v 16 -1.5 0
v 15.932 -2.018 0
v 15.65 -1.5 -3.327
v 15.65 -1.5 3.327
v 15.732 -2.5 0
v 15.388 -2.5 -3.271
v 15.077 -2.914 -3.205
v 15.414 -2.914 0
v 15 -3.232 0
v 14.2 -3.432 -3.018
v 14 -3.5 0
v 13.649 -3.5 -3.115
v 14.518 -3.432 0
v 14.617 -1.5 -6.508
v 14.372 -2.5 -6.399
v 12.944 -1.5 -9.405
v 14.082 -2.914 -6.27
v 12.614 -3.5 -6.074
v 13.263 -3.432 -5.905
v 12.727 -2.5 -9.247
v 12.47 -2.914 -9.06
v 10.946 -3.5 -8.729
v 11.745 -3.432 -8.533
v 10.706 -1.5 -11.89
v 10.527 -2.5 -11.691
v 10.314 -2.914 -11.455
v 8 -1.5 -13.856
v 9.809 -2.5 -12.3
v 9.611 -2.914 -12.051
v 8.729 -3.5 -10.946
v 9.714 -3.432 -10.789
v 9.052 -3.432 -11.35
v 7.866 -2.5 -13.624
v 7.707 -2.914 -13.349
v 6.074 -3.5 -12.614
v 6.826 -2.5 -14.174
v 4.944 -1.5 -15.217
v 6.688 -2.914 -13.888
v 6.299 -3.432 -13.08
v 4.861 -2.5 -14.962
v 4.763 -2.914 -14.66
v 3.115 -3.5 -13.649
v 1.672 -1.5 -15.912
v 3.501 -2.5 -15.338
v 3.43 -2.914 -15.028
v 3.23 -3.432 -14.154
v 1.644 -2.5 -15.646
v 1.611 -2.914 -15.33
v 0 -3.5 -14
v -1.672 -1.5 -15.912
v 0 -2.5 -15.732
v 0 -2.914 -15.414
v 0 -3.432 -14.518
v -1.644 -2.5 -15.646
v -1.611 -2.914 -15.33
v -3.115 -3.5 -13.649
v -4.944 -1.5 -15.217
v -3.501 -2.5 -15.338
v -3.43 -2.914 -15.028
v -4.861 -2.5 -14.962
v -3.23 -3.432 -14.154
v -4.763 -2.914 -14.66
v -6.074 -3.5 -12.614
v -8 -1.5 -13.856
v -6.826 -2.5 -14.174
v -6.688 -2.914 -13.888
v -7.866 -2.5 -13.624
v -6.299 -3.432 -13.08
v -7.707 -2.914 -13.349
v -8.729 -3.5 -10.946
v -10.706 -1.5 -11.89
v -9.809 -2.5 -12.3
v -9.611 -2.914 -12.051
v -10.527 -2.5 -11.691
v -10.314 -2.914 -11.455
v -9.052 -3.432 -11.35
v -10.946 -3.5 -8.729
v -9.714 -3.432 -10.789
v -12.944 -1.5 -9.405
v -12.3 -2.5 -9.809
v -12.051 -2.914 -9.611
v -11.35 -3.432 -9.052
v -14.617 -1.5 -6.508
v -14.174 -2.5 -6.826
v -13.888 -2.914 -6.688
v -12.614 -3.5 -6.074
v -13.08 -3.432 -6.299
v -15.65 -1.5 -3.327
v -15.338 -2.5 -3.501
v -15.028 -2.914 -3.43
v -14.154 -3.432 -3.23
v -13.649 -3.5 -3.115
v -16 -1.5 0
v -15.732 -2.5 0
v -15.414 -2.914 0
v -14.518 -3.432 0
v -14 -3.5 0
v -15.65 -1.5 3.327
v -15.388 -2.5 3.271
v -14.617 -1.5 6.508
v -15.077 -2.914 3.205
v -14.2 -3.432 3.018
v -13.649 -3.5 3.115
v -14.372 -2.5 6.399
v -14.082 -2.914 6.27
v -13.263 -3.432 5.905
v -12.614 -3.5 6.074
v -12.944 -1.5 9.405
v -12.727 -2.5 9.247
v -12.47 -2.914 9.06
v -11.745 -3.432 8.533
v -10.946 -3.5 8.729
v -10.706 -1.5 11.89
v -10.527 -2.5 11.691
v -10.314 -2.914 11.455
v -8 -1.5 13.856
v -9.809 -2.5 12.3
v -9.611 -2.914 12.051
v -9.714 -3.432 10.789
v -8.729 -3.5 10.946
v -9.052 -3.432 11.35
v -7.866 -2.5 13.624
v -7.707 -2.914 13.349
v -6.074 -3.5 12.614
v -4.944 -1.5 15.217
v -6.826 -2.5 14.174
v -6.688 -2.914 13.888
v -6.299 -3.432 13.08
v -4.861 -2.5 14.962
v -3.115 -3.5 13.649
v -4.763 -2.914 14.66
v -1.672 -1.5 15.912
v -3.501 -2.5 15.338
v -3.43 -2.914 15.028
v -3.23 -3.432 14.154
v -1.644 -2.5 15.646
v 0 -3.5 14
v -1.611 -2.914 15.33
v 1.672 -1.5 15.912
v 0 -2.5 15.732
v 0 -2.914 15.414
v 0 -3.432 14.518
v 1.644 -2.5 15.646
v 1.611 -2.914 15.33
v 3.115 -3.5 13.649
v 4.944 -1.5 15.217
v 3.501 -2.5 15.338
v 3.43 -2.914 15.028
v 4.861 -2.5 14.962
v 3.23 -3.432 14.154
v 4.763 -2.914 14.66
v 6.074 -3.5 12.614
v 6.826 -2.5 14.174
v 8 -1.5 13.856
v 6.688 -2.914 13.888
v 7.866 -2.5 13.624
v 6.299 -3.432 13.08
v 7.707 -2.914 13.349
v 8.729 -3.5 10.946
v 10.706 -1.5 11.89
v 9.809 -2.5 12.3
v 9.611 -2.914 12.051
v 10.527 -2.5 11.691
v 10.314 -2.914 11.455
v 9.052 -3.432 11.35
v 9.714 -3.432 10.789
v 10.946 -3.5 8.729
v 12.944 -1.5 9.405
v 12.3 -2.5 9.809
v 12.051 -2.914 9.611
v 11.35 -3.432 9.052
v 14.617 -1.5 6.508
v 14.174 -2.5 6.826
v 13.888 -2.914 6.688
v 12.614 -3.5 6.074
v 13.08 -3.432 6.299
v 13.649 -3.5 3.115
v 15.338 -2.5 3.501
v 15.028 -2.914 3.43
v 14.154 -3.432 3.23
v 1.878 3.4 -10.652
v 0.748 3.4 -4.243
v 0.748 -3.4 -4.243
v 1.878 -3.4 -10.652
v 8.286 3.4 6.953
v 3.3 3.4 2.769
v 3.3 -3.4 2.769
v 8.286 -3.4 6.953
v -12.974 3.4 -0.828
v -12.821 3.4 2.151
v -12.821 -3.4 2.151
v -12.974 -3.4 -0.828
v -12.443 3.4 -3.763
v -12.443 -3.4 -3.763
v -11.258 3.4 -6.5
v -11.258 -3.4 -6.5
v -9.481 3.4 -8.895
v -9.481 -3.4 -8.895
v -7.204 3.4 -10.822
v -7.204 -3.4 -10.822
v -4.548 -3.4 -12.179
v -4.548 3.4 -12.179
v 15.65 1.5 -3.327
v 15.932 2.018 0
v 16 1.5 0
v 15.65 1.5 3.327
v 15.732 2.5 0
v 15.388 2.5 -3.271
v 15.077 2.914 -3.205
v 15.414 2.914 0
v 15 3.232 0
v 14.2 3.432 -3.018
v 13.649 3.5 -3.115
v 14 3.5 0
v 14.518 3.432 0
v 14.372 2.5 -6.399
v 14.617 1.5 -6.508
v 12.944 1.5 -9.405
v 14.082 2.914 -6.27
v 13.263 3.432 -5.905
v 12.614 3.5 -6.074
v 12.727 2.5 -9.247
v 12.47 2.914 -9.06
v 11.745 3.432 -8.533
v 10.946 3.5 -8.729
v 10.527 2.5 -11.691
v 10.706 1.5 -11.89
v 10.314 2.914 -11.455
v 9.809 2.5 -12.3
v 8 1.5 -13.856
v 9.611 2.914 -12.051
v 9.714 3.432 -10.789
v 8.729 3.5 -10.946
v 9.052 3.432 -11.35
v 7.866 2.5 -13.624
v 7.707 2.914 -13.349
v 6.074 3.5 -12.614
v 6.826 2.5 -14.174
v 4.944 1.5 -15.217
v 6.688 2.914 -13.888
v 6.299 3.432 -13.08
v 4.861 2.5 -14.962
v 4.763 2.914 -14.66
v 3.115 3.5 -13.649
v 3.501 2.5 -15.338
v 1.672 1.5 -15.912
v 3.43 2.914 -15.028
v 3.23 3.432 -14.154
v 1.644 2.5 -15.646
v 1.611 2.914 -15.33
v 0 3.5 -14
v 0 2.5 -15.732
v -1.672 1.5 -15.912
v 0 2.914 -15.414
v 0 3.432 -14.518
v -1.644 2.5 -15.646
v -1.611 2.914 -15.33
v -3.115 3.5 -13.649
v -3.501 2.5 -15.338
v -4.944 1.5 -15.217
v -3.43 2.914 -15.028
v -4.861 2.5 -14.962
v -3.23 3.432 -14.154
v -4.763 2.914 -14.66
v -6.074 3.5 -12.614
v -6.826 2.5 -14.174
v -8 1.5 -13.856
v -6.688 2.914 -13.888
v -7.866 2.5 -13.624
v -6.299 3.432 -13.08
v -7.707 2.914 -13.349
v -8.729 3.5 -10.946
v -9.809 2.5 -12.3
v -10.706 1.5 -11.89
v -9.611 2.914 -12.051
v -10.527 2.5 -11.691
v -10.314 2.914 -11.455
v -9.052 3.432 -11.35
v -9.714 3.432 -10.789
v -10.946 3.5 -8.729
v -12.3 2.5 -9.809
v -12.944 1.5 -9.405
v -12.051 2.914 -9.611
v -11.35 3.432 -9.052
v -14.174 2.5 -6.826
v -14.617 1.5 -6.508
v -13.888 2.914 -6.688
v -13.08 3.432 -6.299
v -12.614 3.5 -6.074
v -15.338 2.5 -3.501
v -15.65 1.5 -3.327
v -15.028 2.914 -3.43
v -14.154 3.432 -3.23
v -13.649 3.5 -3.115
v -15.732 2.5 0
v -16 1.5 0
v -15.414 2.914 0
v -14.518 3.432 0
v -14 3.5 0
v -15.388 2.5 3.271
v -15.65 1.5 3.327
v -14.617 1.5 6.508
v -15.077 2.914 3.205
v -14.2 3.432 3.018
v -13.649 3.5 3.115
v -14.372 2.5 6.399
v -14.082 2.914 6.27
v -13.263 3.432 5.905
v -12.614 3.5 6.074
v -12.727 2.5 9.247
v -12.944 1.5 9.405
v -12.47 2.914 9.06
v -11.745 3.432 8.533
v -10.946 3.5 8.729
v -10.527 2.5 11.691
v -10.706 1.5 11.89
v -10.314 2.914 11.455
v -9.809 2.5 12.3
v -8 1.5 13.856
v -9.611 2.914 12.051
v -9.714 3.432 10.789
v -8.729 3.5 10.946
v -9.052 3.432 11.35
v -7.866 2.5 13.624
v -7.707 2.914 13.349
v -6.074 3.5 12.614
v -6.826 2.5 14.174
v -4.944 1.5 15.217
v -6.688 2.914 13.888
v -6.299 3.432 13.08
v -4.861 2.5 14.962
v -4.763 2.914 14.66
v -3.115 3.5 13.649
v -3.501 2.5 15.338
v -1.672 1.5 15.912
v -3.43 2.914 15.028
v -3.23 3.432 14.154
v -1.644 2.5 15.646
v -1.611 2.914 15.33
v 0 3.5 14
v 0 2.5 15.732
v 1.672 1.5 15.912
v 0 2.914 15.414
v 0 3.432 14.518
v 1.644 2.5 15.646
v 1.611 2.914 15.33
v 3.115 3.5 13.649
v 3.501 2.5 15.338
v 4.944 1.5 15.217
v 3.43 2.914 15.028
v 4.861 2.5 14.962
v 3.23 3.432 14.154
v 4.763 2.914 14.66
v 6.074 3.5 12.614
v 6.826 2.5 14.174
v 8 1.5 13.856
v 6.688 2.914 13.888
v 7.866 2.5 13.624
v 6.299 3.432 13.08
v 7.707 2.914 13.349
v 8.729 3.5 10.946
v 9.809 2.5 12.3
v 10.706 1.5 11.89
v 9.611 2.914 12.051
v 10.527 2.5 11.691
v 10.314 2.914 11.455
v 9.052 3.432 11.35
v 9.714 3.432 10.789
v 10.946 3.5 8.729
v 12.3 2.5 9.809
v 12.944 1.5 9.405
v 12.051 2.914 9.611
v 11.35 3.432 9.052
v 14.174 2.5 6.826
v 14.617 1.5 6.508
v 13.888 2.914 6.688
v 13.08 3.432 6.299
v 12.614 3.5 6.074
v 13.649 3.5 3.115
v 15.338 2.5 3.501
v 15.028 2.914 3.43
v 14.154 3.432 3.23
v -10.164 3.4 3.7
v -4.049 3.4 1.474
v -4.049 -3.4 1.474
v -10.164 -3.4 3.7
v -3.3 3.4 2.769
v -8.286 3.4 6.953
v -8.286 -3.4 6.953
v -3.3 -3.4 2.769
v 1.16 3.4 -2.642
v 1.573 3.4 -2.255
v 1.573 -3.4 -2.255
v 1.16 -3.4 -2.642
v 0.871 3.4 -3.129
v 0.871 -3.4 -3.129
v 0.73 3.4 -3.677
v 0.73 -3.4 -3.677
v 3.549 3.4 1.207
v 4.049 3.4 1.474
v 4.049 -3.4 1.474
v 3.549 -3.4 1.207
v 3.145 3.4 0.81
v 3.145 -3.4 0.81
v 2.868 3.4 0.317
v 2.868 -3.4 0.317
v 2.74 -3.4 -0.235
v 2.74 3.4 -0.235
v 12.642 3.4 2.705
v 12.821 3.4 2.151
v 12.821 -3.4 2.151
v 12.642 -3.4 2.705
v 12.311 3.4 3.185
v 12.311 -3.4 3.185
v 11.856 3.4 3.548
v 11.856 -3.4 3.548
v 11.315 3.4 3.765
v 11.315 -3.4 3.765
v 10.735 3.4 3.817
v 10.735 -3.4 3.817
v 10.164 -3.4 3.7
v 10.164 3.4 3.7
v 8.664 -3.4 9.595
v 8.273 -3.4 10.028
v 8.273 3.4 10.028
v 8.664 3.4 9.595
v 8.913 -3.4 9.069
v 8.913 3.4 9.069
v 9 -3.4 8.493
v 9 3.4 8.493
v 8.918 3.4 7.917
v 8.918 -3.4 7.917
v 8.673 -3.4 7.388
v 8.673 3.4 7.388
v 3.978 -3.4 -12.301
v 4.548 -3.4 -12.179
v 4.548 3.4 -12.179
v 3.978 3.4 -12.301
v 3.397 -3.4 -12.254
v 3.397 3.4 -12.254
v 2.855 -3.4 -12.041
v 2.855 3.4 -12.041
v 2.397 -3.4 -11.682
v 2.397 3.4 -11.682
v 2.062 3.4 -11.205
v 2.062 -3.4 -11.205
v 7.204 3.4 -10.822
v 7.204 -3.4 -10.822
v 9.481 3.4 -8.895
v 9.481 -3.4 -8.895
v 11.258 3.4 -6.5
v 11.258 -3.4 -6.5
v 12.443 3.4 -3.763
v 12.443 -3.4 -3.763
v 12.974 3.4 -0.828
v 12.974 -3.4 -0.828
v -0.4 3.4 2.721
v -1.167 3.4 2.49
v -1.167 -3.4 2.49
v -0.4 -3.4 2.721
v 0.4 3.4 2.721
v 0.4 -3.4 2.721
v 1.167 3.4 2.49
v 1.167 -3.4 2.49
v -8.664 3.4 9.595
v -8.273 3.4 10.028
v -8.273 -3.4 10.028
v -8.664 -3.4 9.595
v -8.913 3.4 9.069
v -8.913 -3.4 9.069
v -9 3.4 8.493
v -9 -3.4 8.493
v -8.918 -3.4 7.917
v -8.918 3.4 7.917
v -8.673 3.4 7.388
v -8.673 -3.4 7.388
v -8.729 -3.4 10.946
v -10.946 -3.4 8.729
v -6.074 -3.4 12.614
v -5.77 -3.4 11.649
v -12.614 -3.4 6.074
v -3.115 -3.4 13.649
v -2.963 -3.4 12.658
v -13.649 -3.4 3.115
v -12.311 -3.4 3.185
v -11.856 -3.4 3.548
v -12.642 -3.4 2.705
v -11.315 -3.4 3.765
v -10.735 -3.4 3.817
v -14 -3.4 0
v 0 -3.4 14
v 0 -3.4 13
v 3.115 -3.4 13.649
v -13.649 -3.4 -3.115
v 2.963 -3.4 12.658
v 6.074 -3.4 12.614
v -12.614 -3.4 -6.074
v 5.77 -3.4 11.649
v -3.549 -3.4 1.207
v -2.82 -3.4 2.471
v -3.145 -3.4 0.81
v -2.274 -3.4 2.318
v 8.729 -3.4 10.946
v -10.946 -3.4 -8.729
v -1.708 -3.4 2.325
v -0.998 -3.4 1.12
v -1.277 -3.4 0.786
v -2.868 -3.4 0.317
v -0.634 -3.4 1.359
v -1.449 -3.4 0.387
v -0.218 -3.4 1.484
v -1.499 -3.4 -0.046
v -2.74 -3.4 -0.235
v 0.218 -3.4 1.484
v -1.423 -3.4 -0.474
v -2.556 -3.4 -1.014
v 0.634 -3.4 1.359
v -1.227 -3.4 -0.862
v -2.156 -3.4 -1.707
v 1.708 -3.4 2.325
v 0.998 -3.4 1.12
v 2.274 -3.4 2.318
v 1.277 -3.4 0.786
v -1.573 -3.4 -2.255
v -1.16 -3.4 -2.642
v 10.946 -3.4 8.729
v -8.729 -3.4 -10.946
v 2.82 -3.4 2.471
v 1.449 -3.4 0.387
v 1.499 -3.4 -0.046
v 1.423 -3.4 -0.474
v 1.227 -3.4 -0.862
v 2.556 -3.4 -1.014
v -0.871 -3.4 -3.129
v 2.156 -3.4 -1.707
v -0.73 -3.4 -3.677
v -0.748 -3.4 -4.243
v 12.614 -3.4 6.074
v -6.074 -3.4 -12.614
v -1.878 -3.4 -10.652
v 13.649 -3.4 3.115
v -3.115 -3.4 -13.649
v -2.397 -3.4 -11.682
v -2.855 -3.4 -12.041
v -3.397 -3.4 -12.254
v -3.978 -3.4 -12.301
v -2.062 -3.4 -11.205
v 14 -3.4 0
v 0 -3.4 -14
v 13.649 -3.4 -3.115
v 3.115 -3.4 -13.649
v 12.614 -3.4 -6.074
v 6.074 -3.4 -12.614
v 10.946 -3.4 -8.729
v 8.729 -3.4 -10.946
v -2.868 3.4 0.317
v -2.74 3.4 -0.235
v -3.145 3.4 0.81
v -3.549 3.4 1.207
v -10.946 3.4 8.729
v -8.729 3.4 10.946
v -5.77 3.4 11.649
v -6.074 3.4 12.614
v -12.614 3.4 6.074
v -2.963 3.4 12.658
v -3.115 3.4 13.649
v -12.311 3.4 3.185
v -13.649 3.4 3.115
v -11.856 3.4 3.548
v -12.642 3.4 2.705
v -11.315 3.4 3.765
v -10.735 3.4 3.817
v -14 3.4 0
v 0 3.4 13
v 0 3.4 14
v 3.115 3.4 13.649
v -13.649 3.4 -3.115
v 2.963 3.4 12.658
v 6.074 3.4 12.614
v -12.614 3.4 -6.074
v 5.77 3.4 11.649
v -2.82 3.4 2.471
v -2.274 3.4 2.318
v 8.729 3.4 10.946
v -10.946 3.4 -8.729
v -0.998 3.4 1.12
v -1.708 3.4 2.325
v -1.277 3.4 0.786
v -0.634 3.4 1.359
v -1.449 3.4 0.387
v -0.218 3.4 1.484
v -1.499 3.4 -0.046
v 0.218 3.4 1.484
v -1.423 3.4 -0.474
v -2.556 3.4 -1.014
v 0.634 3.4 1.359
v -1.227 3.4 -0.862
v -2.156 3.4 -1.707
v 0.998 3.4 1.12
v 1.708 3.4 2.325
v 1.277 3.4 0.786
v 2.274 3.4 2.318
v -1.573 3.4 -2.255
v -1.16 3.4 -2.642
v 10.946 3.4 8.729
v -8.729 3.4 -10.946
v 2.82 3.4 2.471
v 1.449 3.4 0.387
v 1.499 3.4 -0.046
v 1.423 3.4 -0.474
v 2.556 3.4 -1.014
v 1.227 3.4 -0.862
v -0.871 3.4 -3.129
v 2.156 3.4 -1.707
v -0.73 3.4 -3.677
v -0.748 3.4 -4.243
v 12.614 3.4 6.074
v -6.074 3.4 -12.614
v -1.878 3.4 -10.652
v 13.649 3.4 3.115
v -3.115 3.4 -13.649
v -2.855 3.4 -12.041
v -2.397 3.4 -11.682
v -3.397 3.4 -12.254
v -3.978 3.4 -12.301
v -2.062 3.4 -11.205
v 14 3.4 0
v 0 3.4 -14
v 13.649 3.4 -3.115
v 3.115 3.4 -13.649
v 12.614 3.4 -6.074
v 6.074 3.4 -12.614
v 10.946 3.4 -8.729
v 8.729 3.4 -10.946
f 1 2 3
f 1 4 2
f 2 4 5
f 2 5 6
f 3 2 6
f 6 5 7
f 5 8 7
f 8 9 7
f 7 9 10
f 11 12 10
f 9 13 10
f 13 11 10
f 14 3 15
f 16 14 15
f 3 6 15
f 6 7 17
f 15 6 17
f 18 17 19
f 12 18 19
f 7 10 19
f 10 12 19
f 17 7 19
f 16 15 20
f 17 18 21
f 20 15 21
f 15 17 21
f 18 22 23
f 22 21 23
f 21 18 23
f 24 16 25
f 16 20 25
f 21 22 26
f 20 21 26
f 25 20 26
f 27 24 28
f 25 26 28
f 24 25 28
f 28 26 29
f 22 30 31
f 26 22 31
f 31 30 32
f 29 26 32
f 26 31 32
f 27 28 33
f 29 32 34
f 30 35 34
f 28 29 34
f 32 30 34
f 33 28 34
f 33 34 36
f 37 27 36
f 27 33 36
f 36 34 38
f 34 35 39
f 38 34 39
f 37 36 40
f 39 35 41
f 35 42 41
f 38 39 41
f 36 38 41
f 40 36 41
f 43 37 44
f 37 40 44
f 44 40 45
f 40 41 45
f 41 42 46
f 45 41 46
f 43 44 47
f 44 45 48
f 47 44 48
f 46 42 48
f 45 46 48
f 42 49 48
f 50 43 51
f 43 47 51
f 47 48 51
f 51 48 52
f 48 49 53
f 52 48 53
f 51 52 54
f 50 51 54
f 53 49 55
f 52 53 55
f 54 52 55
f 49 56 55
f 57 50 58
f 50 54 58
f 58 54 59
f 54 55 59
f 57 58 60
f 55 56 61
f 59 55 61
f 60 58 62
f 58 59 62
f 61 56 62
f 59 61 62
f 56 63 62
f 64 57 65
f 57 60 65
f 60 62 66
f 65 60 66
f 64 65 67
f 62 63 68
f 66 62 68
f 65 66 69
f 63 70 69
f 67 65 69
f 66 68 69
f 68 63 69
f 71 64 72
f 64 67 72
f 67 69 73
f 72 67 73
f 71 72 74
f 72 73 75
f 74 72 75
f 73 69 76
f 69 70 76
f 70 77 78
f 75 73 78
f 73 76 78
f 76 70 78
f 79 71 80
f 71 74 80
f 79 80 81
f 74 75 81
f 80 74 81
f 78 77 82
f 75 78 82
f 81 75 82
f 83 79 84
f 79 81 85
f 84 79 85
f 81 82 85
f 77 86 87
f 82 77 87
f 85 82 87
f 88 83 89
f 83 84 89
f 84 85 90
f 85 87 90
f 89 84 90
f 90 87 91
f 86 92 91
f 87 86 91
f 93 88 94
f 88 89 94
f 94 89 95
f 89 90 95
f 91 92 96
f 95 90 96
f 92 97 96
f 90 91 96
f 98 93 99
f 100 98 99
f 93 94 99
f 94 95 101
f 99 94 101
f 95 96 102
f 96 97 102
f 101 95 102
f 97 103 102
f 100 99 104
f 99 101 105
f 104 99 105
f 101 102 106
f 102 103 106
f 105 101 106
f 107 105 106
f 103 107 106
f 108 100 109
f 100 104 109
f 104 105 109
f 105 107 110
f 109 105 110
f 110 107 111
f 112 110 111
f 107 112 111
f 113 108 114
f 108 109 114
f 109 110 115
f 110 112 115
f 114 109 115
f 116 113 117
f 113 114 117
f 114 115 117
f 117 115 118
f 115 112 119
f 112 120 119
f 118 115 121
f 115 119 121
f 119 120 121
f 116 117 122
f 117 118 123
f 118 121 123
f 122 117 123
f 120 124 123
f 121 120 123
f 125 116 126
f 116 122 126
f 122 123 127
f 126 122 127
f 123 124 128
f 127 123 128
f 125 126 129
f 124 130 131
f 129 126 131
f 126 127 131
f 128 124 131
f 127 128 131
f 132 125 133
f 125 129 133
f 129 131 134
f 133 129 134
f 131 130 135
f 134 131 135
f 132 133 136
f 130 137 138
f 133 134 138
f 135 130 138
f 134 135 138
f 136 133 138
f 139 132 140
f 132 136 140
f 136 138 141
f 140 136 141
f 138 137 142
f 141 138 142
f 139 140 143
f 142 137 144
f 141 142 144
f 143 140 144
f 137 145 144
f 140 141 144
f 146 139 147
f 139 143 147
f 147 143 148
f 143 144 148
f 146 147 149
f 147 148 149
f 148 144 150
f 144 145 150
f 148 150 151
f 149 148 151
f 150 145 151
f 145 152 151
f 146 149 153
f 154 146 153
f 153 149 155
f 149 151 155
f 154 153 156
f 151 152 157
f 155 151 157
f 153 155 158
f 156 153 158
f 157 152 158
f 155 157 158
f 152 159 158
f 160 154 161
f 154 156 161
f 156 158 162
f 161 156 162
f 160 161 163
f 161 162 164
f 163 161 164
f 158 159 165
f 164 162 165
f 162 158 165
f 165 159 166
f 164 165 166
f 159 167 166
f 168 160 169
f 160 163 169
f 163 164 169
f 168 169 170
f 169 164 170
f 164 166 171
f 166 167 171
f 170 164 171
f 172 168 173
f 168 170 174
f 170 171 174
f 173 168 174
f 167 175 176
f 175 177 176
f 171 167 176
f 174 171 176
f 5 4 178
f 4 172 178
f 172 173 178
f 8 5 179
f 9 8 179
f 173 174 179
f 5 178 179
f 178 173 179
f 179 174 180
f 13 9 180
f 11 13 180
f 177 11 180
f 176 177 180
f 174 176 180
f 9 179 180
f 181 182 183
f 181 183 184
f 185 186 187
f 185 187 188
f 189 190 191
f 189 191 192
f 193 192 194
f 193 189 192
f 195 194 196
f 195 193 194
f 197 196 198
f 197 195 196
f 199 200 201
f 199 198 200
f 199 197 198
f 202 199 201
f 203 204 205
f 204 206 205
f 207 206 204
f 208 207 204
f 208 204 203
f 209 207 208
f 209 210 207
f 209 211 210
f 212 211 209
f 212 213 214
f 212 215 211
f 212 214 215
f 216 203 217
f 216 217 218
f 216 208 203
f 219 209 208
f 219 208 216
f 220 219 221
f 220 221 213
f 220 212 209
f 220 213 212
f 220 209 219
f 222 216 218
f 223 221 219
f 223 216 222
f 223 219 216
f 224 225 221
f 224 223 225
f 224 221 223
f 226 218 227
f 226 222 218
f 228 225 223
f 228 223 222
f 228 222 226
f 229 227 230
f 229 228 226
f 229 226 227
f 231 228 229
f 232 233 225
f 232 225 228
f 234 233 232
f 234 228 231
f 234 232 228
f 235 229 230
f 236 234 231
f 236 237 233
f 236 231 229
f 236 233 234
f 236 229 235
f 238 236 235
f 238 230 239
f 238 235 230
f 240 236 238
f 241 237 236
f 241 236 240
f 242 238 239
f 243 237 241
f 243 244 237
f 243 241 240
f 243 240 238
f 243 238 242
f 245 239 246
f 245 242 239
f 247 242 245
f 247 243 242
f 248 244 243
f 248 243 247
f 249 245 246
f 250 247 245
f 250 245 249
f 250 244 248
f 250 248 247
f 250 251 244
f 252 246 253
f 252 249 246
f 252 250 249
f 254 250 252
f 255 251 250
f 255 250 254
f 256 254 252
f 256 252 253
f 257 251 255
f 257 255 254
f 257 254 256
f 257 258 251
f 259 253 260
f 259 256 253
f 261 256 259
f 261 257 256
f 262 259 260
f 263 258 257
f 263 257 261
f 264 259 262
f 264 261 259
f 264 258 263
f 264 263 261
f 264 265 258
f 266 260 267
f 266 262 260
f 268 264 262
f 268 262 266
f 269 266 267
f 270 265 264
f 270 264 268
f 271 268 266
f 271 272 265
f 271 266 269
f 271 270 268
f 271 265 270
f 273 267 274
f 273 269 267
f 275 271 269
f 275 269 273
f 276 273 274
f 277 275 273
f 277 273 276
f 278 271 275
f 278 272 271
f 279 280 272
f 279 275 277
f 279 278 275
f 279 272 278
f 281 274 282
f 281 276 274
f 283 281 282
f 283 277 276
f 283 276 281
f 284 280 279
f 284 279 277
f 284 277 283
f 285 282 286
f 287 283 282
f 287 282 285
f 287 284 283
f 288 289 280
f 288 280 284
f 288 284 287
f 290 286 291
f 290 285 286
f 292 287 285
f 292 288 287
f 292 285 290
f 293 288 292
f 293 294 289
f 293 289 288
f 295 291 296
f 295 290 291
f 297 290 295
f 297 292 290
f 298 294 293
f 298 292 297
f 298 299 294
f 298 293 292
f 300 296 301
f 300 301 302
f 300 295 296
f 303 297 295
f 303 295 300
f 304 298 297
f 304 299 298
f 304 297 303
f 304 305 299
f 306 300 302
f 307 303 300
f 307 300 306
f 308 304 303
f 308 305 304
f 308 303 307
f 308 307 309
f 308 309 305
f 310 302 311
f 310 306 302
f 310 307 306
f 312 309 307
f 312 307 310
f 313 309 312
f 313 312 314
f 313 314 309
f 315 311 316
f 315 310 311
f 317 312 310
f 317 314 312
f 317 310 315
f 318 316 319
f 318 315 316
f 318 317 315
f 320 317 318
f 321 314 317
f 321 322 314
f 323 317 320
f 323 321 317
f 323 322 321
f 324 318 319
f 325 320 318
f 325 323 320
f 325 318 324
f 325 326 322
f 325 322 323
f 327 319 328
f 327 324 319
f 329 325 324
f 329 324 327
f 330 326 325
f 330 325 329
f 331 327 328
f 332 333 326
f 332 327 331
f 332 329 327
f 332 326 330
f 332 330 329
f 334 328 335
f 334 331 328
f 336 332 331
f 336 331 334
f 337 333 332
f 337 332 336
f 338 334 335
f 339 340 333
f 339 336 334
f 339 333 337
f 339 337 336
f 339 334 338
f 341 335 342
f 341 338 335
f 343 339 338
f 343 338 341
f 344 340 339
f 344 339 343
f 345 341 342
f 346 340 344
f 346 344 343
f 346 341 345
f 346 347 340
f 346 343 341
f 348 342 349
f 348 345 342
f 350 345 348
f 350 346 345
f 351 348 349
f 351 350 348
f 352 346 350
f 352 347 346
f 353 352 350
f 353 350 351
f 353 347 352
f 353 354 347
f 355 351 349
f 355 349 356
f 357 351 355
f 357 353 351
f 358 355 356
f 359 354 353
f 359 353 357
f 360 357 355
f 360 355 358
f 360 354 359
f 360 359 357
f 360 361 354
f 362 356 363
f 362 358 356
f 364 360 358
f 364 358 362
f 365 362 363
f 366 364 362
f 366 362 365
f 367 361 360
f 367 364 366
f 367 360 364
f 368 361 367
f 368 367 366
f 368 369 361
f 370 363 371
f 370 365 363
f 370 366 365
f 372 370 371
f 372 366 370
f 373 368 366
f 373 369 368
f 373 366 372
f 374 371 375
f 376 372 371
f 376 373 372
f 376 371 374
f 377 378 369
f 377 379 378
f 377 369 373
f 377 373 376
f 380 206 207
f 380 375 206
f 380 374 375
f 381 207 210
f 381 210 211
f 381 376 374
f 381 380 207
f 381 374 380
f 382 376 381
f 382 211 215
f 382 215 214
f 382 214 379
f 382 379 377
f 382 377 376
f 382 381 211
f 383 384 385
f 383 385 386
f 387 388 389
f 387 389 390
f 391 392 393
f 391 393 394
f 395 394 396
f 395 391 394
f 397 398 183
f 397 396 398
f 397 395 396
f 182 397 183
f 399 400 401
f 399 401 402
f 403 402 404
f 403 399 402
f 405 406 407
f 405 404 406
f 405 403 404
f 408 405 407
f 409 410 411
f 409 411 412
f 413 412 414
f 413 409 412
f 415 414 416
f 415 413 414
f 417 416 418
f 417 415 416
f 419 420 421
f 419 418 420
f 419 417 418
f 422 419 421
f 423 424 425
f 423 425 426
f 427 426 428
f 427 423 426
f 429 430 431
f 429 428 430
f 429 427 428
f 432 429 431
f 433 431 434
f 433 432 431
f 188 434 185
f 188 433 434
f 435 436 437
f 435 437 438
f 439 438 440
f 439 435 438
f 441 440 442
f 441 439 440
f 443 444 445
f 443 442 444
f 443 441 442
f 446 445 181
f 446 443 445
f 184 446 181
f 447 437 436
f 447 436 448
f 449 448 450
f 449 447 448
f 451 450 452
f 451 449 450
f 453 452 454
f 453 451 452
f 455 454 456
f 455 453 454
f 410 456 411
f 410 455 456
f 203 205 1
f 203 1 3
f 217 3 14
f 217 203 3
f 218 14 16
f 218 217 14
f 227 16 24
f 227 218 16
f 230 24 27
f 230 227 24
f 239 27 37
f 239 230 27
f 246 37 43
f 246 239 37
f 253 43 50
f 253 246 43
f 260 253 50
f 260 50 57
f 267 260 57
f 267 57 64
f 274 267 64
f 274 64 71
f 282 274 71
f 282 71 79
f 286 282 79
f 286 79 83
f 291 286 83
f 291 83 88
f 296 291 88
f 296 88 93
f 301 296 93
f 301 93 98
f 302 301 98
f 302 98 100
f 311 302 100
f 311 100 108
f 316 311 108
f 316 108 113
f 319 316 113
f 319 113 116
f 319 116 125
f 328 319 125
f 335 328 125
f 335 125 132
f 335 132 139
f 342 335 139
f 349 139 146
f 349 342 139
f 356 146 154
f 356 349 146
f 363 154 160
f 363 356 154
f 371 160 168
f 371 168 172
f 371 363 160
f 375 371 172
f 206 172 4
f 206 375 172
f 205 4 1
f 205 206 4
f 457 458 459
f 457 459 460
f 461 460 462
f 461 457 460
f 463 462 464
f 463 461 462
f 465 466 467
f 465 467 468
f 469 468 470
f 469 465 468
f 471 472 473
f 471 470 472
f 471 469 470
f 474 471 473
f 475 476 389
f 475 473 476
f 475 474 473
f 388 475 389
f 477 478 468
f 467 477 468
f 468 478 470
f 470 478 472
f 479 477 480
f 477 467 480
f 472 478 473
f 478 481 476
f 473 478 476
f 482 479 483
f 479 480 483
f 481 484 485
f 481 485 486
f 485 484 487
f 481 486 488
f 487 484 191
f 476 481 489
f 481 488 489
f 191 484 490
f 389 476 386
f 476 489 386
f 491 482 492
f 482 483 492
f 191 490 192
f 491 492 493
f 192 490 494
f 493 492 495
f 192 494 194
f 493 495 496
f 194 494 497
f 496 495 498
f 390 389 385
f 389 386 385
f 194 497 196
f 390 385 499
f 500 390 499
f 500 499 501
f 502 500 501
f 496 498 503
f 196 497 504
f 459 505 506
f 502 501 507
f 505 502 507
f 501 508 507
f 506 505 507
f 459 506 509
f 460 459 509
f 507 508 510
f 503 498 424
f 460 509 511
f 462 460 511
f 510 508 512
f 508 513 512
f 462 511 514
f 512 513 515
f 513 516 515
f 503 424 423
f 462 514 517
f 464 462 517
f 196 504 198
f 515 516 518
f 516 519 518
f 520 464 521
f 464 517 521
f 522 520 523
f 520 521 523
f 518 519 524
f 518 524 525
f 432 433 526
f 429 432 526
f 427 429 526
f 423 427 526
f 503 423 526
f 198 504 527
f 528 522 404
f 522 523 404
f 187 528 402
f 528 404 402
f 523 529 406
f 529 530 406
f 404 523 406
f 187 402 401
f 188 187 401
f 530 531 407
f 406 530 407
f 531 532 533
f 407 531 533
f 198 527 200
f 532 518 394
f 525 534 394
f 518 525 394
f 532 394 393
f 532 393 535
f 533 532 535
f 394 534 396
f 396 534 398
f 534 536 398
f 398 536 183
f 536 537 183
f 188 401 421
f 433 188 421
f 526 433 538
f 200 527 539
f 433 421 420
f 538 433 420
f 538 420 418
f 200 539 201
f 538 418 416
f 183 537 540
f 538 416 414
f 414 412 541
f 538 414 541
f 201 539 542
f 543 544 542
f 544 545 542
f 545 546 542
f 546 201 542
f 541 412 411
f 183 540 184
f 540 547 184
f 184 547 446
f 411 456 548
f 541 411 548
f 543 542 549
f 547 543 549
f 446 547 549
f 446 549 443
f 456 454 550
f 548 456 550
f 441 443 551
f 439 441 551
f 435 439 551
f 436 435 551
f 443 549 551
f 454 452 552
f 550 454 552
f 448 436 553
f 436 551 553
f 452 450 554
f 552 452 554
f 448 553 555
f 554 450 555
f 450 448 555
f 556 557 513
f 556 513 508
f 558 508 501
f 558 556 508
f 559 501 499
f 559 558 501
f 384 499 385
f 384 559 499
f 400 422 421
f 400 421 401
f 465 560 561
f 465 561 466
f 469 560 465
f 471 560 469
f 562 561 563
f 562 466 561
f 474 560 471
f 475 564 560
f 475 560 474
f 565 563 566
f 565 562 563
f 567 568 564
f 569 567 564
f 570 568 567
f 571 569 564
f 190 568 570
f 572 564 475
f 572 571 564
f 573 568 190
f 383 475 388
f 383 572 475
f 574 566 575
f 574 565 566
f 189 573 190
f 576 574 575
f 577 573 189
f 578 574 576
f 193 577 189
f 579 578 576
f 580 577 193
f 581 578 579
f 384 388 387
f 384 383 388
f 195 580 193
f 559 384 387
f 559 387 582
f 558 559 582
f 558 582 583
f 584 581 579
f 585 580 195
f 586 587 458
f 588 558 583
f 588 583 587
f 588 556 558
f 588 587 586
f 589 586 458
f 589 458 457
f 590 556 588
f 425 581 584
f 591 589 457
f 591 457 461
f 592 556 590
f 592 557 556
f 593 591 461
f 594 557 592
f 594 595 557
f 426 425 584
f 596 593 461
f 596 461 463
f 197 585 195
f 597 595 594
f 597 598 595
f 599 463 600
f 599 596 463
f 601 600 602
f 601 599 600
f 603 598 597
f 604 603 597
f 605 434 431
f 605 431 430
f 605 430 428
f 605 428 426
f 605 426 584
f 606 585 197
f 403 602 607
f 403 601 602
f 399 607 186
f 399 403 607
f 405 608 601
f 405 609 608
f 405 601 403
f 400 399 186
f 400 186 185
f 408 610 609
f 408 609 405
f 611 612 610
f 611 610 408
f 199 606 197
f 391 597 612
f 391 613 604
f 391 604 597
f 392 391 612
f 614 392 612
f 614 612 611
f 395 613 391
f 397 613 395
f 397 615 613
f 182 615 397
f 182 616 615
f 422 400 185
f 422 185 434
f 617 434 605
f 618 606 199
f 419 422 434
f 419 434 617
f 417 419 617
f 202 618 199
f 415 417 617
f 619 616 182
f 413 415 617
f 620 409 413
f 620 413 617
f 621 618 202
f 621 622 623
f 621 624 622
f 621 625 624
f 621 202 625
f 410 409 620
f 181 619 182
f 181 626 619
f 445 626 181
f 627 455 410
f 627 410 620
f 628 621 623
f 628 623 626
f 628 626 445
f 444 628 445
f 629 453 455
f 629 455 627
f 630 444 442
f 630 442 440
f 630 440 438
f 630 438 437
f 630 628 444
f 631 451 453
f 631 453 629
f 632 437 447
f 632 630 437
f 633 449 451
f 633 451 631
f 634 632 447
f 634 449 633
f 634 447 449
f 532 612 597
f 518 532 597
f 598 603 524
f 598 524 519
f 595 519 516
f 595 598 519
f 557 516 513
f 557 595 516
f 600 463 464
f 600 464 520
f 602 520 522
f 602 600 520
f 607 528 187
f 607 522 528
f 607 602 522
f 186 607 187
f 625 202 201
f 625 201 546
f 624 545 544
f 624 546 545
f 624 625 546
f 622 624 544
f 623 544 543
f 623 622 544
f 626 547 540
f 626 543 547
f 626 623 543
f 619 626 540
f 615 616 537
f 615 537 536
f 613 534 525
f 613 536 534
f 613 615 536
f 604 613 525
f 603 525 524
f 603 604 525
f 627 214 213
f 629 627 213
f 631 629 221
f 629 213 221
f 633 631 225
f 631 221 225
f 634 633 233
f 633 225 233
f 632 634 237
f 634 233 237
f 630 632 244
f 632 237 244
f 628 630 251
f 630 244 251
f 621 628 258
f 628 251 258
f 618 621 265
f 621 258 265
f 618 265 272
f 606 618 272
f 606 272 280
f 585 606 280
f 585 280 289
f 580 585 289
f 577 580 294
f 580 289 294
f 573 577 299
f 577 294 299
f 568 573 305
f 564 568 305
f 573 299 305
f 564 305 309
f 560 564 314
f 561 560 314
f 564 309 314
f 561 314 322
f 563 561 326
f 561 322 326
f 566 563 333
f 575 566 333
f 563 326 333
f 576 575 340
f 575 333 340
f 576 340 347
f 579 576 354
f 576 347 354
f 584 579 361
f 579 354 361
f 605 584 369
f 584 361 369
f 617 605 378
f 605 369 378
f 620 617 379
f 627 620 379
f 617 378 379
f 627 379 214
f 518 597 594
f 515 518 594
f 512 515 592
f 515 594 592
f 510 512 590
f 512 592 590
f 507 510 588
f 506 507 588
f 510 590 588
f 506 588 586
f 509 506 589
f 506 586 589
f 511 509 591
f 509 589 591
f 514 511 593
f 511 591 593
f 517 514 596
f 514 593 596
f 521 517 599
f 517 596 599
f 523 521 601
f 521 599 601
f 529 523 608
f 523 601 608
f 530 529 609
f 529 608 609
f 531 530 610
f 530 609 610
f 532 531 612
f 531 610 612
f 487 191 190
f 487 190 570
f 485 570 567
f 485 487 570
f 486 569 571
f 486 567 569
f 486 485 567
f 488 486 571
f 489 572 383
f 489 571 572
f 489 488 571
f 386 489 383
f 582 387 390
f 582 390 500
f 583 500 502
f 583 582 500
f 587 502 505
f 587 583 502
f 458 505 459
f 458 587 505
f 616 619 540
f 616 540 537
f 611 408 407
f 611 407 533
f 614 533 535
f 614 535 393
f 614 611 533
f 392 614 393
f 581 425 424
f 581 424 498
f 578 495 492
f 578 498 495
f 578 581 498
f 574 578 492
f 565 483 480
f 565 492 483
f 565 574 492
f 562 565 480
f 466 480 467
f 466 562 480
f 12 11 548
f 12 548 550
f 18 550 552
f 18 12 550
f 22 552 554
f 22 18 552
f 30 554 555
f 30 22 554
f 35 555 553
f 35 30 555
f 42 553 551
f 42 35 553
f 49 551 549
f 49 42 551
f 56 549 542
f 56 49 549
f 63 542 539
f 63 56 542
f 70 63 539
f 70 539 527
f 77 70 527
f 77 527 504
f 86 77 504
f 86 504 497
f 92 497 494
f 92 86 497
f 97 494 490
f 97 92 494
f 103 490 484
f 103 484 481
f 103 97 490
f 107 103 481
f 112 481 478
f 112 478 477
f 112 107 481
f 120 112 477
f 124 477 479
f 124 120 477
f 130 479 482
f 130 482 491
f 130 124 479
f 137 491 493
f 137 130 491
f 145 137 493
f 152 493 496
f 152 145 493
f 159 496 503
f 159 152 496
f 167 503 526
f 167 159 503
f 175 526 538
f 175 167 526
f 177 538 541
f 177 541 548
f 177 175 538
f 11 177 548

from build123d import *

# Parameters (mm, degrees)
SKETCH1_R           = 16
SKETCH1_R_2         = 13
SKETCH1_R_3         = 2.75
BOSS_EXTRUDE1_DEPTH = 3.5
FILLET2_R           = 2
FILLET3_R           = 2
SKETCH4_R           = 14
CUT_EXTRUDE2_DEPTH  = 0.1


with BuildPart() as part:
    # Sketch1 → Boss-Extrude1 (new body, symmetric)
    with BuildSketch(Plane(origin=(0, 0, 0), x_dir=(1, 0, 0), z_dir=(0, 1, 0))):
        Circle(SKETCH1_R)
        Circle(SKETCH1_R_2, mode=Mode.SUBTRACT)
        with BuildLine():
            ThreePointArc((-2.106622219, -1.767665927), (-2.38156986, -1.375), (-2.584154707, -0.940555394))
            Line((-2.584154707, -0.940555394), (-12.21600407, -4.446261863))
            ThreePointArc((-12.21600407, -4.446261863), (-11.258330249, -6.5), (-9.958577761, -8.356238926))
            Line((-9.958577761, -8.356238926), (-2.106622219, -1.767665927))
        make_face()
        Circle(SKETCH1_R_3)
        with BuildLine():
            ThreePointArc((-1.227230113, 0.8625), (0, -1.5), (1.227230113, 0.8625))
            Line((1.227230113, 0.8625), (-1.227230113, 0.8625))
        make_face(mode=Mode.SUBTRACT)
        with BuildLine():
            Line((-2.25742631, 12.802500789), (-0.477532489, 2.708221321))
            ThreePointArc((-0.477532489, 2.708221321), (0, 2.75), (0.477532489, 2.708221321))
            Line((0.477532489, 2.708221321), (2.25742631, 12.802500789))
            ThreePointArc((2.25742631, 12.802500789), (0, 13), (-2.25742631, 12.802500789))
        make_face()
        with BuildLine():
            Line((12.21600407, -4.446261863), (2.584154707, -0.940555394))
            ThreePointArc((2.584154707, -0.940555394), (2.38156986, -1.375), (2.106622219, -1.767665927))
            Line((2.106622219, -1.767665927), (9.958577761, -8.356238926))
            ThreePointArc((9.958577761, -8.356238926), (11.258330249, -6.5), (12.21600407, -4.446261863))
        make_face()
    extrude(amount=BOSS_EXTRUDE1_DEPTH, both=True)

    # Fillet2
    fillet2_edges = [part.edges().sort_by_distance(p)[0] for p in [
        (-16, -3.5, 0),
        (-16, 3.5, 0),
    ]]
    fillet(fillet2_edges, radius=FILLET2_R)

    # Fillet3
    fillet3_edges = [part.edges().sort_by_distance(p)[0] for p in [
        (2.584154707, 0, 0.940555394),
        (12.21600407, 0, 4.446261863),
        (2.25742631, 0, -12.802500789),
        (0.477532489, 0, -2.708221321),
        (-2.25742631, 0, -12.802500789),
        (-12.21600407, 0, 4.446261863),
        (-2.584154707, 0, 0.940555394),
        (-0.477532489, 0, -2.708221321),
        (-9.958577761, 0, 8.356238926),
        (9.958577761, 0, 8.356238926),
        (2.106622219, 0, 1.767665927),
        (-2.106622219, 0, 1.767665927),
    ]]
    fillet(fillet3_edges, radius=FILLET3_R)

    # Sketch4 → Cut-Extrude2 (cut)
    with BuildSketch(Plane(origin=(0, 3.5, 0), x_dir=(1, 0, 0), z_dir=(0, 1, 0))):
        Circle(SKETCH4_R)
    cut_extrude2 = extrude(amount=-CUT_EXTRUDE2_DEPTH, mode=Mode.SUBTRACT)

    # Mirror1: Cut-Extrude2 across plane
    add(cut_extrude2.mirror(Plane.ZX), mode=Mode.SUBTRACT)


solid = part.part
